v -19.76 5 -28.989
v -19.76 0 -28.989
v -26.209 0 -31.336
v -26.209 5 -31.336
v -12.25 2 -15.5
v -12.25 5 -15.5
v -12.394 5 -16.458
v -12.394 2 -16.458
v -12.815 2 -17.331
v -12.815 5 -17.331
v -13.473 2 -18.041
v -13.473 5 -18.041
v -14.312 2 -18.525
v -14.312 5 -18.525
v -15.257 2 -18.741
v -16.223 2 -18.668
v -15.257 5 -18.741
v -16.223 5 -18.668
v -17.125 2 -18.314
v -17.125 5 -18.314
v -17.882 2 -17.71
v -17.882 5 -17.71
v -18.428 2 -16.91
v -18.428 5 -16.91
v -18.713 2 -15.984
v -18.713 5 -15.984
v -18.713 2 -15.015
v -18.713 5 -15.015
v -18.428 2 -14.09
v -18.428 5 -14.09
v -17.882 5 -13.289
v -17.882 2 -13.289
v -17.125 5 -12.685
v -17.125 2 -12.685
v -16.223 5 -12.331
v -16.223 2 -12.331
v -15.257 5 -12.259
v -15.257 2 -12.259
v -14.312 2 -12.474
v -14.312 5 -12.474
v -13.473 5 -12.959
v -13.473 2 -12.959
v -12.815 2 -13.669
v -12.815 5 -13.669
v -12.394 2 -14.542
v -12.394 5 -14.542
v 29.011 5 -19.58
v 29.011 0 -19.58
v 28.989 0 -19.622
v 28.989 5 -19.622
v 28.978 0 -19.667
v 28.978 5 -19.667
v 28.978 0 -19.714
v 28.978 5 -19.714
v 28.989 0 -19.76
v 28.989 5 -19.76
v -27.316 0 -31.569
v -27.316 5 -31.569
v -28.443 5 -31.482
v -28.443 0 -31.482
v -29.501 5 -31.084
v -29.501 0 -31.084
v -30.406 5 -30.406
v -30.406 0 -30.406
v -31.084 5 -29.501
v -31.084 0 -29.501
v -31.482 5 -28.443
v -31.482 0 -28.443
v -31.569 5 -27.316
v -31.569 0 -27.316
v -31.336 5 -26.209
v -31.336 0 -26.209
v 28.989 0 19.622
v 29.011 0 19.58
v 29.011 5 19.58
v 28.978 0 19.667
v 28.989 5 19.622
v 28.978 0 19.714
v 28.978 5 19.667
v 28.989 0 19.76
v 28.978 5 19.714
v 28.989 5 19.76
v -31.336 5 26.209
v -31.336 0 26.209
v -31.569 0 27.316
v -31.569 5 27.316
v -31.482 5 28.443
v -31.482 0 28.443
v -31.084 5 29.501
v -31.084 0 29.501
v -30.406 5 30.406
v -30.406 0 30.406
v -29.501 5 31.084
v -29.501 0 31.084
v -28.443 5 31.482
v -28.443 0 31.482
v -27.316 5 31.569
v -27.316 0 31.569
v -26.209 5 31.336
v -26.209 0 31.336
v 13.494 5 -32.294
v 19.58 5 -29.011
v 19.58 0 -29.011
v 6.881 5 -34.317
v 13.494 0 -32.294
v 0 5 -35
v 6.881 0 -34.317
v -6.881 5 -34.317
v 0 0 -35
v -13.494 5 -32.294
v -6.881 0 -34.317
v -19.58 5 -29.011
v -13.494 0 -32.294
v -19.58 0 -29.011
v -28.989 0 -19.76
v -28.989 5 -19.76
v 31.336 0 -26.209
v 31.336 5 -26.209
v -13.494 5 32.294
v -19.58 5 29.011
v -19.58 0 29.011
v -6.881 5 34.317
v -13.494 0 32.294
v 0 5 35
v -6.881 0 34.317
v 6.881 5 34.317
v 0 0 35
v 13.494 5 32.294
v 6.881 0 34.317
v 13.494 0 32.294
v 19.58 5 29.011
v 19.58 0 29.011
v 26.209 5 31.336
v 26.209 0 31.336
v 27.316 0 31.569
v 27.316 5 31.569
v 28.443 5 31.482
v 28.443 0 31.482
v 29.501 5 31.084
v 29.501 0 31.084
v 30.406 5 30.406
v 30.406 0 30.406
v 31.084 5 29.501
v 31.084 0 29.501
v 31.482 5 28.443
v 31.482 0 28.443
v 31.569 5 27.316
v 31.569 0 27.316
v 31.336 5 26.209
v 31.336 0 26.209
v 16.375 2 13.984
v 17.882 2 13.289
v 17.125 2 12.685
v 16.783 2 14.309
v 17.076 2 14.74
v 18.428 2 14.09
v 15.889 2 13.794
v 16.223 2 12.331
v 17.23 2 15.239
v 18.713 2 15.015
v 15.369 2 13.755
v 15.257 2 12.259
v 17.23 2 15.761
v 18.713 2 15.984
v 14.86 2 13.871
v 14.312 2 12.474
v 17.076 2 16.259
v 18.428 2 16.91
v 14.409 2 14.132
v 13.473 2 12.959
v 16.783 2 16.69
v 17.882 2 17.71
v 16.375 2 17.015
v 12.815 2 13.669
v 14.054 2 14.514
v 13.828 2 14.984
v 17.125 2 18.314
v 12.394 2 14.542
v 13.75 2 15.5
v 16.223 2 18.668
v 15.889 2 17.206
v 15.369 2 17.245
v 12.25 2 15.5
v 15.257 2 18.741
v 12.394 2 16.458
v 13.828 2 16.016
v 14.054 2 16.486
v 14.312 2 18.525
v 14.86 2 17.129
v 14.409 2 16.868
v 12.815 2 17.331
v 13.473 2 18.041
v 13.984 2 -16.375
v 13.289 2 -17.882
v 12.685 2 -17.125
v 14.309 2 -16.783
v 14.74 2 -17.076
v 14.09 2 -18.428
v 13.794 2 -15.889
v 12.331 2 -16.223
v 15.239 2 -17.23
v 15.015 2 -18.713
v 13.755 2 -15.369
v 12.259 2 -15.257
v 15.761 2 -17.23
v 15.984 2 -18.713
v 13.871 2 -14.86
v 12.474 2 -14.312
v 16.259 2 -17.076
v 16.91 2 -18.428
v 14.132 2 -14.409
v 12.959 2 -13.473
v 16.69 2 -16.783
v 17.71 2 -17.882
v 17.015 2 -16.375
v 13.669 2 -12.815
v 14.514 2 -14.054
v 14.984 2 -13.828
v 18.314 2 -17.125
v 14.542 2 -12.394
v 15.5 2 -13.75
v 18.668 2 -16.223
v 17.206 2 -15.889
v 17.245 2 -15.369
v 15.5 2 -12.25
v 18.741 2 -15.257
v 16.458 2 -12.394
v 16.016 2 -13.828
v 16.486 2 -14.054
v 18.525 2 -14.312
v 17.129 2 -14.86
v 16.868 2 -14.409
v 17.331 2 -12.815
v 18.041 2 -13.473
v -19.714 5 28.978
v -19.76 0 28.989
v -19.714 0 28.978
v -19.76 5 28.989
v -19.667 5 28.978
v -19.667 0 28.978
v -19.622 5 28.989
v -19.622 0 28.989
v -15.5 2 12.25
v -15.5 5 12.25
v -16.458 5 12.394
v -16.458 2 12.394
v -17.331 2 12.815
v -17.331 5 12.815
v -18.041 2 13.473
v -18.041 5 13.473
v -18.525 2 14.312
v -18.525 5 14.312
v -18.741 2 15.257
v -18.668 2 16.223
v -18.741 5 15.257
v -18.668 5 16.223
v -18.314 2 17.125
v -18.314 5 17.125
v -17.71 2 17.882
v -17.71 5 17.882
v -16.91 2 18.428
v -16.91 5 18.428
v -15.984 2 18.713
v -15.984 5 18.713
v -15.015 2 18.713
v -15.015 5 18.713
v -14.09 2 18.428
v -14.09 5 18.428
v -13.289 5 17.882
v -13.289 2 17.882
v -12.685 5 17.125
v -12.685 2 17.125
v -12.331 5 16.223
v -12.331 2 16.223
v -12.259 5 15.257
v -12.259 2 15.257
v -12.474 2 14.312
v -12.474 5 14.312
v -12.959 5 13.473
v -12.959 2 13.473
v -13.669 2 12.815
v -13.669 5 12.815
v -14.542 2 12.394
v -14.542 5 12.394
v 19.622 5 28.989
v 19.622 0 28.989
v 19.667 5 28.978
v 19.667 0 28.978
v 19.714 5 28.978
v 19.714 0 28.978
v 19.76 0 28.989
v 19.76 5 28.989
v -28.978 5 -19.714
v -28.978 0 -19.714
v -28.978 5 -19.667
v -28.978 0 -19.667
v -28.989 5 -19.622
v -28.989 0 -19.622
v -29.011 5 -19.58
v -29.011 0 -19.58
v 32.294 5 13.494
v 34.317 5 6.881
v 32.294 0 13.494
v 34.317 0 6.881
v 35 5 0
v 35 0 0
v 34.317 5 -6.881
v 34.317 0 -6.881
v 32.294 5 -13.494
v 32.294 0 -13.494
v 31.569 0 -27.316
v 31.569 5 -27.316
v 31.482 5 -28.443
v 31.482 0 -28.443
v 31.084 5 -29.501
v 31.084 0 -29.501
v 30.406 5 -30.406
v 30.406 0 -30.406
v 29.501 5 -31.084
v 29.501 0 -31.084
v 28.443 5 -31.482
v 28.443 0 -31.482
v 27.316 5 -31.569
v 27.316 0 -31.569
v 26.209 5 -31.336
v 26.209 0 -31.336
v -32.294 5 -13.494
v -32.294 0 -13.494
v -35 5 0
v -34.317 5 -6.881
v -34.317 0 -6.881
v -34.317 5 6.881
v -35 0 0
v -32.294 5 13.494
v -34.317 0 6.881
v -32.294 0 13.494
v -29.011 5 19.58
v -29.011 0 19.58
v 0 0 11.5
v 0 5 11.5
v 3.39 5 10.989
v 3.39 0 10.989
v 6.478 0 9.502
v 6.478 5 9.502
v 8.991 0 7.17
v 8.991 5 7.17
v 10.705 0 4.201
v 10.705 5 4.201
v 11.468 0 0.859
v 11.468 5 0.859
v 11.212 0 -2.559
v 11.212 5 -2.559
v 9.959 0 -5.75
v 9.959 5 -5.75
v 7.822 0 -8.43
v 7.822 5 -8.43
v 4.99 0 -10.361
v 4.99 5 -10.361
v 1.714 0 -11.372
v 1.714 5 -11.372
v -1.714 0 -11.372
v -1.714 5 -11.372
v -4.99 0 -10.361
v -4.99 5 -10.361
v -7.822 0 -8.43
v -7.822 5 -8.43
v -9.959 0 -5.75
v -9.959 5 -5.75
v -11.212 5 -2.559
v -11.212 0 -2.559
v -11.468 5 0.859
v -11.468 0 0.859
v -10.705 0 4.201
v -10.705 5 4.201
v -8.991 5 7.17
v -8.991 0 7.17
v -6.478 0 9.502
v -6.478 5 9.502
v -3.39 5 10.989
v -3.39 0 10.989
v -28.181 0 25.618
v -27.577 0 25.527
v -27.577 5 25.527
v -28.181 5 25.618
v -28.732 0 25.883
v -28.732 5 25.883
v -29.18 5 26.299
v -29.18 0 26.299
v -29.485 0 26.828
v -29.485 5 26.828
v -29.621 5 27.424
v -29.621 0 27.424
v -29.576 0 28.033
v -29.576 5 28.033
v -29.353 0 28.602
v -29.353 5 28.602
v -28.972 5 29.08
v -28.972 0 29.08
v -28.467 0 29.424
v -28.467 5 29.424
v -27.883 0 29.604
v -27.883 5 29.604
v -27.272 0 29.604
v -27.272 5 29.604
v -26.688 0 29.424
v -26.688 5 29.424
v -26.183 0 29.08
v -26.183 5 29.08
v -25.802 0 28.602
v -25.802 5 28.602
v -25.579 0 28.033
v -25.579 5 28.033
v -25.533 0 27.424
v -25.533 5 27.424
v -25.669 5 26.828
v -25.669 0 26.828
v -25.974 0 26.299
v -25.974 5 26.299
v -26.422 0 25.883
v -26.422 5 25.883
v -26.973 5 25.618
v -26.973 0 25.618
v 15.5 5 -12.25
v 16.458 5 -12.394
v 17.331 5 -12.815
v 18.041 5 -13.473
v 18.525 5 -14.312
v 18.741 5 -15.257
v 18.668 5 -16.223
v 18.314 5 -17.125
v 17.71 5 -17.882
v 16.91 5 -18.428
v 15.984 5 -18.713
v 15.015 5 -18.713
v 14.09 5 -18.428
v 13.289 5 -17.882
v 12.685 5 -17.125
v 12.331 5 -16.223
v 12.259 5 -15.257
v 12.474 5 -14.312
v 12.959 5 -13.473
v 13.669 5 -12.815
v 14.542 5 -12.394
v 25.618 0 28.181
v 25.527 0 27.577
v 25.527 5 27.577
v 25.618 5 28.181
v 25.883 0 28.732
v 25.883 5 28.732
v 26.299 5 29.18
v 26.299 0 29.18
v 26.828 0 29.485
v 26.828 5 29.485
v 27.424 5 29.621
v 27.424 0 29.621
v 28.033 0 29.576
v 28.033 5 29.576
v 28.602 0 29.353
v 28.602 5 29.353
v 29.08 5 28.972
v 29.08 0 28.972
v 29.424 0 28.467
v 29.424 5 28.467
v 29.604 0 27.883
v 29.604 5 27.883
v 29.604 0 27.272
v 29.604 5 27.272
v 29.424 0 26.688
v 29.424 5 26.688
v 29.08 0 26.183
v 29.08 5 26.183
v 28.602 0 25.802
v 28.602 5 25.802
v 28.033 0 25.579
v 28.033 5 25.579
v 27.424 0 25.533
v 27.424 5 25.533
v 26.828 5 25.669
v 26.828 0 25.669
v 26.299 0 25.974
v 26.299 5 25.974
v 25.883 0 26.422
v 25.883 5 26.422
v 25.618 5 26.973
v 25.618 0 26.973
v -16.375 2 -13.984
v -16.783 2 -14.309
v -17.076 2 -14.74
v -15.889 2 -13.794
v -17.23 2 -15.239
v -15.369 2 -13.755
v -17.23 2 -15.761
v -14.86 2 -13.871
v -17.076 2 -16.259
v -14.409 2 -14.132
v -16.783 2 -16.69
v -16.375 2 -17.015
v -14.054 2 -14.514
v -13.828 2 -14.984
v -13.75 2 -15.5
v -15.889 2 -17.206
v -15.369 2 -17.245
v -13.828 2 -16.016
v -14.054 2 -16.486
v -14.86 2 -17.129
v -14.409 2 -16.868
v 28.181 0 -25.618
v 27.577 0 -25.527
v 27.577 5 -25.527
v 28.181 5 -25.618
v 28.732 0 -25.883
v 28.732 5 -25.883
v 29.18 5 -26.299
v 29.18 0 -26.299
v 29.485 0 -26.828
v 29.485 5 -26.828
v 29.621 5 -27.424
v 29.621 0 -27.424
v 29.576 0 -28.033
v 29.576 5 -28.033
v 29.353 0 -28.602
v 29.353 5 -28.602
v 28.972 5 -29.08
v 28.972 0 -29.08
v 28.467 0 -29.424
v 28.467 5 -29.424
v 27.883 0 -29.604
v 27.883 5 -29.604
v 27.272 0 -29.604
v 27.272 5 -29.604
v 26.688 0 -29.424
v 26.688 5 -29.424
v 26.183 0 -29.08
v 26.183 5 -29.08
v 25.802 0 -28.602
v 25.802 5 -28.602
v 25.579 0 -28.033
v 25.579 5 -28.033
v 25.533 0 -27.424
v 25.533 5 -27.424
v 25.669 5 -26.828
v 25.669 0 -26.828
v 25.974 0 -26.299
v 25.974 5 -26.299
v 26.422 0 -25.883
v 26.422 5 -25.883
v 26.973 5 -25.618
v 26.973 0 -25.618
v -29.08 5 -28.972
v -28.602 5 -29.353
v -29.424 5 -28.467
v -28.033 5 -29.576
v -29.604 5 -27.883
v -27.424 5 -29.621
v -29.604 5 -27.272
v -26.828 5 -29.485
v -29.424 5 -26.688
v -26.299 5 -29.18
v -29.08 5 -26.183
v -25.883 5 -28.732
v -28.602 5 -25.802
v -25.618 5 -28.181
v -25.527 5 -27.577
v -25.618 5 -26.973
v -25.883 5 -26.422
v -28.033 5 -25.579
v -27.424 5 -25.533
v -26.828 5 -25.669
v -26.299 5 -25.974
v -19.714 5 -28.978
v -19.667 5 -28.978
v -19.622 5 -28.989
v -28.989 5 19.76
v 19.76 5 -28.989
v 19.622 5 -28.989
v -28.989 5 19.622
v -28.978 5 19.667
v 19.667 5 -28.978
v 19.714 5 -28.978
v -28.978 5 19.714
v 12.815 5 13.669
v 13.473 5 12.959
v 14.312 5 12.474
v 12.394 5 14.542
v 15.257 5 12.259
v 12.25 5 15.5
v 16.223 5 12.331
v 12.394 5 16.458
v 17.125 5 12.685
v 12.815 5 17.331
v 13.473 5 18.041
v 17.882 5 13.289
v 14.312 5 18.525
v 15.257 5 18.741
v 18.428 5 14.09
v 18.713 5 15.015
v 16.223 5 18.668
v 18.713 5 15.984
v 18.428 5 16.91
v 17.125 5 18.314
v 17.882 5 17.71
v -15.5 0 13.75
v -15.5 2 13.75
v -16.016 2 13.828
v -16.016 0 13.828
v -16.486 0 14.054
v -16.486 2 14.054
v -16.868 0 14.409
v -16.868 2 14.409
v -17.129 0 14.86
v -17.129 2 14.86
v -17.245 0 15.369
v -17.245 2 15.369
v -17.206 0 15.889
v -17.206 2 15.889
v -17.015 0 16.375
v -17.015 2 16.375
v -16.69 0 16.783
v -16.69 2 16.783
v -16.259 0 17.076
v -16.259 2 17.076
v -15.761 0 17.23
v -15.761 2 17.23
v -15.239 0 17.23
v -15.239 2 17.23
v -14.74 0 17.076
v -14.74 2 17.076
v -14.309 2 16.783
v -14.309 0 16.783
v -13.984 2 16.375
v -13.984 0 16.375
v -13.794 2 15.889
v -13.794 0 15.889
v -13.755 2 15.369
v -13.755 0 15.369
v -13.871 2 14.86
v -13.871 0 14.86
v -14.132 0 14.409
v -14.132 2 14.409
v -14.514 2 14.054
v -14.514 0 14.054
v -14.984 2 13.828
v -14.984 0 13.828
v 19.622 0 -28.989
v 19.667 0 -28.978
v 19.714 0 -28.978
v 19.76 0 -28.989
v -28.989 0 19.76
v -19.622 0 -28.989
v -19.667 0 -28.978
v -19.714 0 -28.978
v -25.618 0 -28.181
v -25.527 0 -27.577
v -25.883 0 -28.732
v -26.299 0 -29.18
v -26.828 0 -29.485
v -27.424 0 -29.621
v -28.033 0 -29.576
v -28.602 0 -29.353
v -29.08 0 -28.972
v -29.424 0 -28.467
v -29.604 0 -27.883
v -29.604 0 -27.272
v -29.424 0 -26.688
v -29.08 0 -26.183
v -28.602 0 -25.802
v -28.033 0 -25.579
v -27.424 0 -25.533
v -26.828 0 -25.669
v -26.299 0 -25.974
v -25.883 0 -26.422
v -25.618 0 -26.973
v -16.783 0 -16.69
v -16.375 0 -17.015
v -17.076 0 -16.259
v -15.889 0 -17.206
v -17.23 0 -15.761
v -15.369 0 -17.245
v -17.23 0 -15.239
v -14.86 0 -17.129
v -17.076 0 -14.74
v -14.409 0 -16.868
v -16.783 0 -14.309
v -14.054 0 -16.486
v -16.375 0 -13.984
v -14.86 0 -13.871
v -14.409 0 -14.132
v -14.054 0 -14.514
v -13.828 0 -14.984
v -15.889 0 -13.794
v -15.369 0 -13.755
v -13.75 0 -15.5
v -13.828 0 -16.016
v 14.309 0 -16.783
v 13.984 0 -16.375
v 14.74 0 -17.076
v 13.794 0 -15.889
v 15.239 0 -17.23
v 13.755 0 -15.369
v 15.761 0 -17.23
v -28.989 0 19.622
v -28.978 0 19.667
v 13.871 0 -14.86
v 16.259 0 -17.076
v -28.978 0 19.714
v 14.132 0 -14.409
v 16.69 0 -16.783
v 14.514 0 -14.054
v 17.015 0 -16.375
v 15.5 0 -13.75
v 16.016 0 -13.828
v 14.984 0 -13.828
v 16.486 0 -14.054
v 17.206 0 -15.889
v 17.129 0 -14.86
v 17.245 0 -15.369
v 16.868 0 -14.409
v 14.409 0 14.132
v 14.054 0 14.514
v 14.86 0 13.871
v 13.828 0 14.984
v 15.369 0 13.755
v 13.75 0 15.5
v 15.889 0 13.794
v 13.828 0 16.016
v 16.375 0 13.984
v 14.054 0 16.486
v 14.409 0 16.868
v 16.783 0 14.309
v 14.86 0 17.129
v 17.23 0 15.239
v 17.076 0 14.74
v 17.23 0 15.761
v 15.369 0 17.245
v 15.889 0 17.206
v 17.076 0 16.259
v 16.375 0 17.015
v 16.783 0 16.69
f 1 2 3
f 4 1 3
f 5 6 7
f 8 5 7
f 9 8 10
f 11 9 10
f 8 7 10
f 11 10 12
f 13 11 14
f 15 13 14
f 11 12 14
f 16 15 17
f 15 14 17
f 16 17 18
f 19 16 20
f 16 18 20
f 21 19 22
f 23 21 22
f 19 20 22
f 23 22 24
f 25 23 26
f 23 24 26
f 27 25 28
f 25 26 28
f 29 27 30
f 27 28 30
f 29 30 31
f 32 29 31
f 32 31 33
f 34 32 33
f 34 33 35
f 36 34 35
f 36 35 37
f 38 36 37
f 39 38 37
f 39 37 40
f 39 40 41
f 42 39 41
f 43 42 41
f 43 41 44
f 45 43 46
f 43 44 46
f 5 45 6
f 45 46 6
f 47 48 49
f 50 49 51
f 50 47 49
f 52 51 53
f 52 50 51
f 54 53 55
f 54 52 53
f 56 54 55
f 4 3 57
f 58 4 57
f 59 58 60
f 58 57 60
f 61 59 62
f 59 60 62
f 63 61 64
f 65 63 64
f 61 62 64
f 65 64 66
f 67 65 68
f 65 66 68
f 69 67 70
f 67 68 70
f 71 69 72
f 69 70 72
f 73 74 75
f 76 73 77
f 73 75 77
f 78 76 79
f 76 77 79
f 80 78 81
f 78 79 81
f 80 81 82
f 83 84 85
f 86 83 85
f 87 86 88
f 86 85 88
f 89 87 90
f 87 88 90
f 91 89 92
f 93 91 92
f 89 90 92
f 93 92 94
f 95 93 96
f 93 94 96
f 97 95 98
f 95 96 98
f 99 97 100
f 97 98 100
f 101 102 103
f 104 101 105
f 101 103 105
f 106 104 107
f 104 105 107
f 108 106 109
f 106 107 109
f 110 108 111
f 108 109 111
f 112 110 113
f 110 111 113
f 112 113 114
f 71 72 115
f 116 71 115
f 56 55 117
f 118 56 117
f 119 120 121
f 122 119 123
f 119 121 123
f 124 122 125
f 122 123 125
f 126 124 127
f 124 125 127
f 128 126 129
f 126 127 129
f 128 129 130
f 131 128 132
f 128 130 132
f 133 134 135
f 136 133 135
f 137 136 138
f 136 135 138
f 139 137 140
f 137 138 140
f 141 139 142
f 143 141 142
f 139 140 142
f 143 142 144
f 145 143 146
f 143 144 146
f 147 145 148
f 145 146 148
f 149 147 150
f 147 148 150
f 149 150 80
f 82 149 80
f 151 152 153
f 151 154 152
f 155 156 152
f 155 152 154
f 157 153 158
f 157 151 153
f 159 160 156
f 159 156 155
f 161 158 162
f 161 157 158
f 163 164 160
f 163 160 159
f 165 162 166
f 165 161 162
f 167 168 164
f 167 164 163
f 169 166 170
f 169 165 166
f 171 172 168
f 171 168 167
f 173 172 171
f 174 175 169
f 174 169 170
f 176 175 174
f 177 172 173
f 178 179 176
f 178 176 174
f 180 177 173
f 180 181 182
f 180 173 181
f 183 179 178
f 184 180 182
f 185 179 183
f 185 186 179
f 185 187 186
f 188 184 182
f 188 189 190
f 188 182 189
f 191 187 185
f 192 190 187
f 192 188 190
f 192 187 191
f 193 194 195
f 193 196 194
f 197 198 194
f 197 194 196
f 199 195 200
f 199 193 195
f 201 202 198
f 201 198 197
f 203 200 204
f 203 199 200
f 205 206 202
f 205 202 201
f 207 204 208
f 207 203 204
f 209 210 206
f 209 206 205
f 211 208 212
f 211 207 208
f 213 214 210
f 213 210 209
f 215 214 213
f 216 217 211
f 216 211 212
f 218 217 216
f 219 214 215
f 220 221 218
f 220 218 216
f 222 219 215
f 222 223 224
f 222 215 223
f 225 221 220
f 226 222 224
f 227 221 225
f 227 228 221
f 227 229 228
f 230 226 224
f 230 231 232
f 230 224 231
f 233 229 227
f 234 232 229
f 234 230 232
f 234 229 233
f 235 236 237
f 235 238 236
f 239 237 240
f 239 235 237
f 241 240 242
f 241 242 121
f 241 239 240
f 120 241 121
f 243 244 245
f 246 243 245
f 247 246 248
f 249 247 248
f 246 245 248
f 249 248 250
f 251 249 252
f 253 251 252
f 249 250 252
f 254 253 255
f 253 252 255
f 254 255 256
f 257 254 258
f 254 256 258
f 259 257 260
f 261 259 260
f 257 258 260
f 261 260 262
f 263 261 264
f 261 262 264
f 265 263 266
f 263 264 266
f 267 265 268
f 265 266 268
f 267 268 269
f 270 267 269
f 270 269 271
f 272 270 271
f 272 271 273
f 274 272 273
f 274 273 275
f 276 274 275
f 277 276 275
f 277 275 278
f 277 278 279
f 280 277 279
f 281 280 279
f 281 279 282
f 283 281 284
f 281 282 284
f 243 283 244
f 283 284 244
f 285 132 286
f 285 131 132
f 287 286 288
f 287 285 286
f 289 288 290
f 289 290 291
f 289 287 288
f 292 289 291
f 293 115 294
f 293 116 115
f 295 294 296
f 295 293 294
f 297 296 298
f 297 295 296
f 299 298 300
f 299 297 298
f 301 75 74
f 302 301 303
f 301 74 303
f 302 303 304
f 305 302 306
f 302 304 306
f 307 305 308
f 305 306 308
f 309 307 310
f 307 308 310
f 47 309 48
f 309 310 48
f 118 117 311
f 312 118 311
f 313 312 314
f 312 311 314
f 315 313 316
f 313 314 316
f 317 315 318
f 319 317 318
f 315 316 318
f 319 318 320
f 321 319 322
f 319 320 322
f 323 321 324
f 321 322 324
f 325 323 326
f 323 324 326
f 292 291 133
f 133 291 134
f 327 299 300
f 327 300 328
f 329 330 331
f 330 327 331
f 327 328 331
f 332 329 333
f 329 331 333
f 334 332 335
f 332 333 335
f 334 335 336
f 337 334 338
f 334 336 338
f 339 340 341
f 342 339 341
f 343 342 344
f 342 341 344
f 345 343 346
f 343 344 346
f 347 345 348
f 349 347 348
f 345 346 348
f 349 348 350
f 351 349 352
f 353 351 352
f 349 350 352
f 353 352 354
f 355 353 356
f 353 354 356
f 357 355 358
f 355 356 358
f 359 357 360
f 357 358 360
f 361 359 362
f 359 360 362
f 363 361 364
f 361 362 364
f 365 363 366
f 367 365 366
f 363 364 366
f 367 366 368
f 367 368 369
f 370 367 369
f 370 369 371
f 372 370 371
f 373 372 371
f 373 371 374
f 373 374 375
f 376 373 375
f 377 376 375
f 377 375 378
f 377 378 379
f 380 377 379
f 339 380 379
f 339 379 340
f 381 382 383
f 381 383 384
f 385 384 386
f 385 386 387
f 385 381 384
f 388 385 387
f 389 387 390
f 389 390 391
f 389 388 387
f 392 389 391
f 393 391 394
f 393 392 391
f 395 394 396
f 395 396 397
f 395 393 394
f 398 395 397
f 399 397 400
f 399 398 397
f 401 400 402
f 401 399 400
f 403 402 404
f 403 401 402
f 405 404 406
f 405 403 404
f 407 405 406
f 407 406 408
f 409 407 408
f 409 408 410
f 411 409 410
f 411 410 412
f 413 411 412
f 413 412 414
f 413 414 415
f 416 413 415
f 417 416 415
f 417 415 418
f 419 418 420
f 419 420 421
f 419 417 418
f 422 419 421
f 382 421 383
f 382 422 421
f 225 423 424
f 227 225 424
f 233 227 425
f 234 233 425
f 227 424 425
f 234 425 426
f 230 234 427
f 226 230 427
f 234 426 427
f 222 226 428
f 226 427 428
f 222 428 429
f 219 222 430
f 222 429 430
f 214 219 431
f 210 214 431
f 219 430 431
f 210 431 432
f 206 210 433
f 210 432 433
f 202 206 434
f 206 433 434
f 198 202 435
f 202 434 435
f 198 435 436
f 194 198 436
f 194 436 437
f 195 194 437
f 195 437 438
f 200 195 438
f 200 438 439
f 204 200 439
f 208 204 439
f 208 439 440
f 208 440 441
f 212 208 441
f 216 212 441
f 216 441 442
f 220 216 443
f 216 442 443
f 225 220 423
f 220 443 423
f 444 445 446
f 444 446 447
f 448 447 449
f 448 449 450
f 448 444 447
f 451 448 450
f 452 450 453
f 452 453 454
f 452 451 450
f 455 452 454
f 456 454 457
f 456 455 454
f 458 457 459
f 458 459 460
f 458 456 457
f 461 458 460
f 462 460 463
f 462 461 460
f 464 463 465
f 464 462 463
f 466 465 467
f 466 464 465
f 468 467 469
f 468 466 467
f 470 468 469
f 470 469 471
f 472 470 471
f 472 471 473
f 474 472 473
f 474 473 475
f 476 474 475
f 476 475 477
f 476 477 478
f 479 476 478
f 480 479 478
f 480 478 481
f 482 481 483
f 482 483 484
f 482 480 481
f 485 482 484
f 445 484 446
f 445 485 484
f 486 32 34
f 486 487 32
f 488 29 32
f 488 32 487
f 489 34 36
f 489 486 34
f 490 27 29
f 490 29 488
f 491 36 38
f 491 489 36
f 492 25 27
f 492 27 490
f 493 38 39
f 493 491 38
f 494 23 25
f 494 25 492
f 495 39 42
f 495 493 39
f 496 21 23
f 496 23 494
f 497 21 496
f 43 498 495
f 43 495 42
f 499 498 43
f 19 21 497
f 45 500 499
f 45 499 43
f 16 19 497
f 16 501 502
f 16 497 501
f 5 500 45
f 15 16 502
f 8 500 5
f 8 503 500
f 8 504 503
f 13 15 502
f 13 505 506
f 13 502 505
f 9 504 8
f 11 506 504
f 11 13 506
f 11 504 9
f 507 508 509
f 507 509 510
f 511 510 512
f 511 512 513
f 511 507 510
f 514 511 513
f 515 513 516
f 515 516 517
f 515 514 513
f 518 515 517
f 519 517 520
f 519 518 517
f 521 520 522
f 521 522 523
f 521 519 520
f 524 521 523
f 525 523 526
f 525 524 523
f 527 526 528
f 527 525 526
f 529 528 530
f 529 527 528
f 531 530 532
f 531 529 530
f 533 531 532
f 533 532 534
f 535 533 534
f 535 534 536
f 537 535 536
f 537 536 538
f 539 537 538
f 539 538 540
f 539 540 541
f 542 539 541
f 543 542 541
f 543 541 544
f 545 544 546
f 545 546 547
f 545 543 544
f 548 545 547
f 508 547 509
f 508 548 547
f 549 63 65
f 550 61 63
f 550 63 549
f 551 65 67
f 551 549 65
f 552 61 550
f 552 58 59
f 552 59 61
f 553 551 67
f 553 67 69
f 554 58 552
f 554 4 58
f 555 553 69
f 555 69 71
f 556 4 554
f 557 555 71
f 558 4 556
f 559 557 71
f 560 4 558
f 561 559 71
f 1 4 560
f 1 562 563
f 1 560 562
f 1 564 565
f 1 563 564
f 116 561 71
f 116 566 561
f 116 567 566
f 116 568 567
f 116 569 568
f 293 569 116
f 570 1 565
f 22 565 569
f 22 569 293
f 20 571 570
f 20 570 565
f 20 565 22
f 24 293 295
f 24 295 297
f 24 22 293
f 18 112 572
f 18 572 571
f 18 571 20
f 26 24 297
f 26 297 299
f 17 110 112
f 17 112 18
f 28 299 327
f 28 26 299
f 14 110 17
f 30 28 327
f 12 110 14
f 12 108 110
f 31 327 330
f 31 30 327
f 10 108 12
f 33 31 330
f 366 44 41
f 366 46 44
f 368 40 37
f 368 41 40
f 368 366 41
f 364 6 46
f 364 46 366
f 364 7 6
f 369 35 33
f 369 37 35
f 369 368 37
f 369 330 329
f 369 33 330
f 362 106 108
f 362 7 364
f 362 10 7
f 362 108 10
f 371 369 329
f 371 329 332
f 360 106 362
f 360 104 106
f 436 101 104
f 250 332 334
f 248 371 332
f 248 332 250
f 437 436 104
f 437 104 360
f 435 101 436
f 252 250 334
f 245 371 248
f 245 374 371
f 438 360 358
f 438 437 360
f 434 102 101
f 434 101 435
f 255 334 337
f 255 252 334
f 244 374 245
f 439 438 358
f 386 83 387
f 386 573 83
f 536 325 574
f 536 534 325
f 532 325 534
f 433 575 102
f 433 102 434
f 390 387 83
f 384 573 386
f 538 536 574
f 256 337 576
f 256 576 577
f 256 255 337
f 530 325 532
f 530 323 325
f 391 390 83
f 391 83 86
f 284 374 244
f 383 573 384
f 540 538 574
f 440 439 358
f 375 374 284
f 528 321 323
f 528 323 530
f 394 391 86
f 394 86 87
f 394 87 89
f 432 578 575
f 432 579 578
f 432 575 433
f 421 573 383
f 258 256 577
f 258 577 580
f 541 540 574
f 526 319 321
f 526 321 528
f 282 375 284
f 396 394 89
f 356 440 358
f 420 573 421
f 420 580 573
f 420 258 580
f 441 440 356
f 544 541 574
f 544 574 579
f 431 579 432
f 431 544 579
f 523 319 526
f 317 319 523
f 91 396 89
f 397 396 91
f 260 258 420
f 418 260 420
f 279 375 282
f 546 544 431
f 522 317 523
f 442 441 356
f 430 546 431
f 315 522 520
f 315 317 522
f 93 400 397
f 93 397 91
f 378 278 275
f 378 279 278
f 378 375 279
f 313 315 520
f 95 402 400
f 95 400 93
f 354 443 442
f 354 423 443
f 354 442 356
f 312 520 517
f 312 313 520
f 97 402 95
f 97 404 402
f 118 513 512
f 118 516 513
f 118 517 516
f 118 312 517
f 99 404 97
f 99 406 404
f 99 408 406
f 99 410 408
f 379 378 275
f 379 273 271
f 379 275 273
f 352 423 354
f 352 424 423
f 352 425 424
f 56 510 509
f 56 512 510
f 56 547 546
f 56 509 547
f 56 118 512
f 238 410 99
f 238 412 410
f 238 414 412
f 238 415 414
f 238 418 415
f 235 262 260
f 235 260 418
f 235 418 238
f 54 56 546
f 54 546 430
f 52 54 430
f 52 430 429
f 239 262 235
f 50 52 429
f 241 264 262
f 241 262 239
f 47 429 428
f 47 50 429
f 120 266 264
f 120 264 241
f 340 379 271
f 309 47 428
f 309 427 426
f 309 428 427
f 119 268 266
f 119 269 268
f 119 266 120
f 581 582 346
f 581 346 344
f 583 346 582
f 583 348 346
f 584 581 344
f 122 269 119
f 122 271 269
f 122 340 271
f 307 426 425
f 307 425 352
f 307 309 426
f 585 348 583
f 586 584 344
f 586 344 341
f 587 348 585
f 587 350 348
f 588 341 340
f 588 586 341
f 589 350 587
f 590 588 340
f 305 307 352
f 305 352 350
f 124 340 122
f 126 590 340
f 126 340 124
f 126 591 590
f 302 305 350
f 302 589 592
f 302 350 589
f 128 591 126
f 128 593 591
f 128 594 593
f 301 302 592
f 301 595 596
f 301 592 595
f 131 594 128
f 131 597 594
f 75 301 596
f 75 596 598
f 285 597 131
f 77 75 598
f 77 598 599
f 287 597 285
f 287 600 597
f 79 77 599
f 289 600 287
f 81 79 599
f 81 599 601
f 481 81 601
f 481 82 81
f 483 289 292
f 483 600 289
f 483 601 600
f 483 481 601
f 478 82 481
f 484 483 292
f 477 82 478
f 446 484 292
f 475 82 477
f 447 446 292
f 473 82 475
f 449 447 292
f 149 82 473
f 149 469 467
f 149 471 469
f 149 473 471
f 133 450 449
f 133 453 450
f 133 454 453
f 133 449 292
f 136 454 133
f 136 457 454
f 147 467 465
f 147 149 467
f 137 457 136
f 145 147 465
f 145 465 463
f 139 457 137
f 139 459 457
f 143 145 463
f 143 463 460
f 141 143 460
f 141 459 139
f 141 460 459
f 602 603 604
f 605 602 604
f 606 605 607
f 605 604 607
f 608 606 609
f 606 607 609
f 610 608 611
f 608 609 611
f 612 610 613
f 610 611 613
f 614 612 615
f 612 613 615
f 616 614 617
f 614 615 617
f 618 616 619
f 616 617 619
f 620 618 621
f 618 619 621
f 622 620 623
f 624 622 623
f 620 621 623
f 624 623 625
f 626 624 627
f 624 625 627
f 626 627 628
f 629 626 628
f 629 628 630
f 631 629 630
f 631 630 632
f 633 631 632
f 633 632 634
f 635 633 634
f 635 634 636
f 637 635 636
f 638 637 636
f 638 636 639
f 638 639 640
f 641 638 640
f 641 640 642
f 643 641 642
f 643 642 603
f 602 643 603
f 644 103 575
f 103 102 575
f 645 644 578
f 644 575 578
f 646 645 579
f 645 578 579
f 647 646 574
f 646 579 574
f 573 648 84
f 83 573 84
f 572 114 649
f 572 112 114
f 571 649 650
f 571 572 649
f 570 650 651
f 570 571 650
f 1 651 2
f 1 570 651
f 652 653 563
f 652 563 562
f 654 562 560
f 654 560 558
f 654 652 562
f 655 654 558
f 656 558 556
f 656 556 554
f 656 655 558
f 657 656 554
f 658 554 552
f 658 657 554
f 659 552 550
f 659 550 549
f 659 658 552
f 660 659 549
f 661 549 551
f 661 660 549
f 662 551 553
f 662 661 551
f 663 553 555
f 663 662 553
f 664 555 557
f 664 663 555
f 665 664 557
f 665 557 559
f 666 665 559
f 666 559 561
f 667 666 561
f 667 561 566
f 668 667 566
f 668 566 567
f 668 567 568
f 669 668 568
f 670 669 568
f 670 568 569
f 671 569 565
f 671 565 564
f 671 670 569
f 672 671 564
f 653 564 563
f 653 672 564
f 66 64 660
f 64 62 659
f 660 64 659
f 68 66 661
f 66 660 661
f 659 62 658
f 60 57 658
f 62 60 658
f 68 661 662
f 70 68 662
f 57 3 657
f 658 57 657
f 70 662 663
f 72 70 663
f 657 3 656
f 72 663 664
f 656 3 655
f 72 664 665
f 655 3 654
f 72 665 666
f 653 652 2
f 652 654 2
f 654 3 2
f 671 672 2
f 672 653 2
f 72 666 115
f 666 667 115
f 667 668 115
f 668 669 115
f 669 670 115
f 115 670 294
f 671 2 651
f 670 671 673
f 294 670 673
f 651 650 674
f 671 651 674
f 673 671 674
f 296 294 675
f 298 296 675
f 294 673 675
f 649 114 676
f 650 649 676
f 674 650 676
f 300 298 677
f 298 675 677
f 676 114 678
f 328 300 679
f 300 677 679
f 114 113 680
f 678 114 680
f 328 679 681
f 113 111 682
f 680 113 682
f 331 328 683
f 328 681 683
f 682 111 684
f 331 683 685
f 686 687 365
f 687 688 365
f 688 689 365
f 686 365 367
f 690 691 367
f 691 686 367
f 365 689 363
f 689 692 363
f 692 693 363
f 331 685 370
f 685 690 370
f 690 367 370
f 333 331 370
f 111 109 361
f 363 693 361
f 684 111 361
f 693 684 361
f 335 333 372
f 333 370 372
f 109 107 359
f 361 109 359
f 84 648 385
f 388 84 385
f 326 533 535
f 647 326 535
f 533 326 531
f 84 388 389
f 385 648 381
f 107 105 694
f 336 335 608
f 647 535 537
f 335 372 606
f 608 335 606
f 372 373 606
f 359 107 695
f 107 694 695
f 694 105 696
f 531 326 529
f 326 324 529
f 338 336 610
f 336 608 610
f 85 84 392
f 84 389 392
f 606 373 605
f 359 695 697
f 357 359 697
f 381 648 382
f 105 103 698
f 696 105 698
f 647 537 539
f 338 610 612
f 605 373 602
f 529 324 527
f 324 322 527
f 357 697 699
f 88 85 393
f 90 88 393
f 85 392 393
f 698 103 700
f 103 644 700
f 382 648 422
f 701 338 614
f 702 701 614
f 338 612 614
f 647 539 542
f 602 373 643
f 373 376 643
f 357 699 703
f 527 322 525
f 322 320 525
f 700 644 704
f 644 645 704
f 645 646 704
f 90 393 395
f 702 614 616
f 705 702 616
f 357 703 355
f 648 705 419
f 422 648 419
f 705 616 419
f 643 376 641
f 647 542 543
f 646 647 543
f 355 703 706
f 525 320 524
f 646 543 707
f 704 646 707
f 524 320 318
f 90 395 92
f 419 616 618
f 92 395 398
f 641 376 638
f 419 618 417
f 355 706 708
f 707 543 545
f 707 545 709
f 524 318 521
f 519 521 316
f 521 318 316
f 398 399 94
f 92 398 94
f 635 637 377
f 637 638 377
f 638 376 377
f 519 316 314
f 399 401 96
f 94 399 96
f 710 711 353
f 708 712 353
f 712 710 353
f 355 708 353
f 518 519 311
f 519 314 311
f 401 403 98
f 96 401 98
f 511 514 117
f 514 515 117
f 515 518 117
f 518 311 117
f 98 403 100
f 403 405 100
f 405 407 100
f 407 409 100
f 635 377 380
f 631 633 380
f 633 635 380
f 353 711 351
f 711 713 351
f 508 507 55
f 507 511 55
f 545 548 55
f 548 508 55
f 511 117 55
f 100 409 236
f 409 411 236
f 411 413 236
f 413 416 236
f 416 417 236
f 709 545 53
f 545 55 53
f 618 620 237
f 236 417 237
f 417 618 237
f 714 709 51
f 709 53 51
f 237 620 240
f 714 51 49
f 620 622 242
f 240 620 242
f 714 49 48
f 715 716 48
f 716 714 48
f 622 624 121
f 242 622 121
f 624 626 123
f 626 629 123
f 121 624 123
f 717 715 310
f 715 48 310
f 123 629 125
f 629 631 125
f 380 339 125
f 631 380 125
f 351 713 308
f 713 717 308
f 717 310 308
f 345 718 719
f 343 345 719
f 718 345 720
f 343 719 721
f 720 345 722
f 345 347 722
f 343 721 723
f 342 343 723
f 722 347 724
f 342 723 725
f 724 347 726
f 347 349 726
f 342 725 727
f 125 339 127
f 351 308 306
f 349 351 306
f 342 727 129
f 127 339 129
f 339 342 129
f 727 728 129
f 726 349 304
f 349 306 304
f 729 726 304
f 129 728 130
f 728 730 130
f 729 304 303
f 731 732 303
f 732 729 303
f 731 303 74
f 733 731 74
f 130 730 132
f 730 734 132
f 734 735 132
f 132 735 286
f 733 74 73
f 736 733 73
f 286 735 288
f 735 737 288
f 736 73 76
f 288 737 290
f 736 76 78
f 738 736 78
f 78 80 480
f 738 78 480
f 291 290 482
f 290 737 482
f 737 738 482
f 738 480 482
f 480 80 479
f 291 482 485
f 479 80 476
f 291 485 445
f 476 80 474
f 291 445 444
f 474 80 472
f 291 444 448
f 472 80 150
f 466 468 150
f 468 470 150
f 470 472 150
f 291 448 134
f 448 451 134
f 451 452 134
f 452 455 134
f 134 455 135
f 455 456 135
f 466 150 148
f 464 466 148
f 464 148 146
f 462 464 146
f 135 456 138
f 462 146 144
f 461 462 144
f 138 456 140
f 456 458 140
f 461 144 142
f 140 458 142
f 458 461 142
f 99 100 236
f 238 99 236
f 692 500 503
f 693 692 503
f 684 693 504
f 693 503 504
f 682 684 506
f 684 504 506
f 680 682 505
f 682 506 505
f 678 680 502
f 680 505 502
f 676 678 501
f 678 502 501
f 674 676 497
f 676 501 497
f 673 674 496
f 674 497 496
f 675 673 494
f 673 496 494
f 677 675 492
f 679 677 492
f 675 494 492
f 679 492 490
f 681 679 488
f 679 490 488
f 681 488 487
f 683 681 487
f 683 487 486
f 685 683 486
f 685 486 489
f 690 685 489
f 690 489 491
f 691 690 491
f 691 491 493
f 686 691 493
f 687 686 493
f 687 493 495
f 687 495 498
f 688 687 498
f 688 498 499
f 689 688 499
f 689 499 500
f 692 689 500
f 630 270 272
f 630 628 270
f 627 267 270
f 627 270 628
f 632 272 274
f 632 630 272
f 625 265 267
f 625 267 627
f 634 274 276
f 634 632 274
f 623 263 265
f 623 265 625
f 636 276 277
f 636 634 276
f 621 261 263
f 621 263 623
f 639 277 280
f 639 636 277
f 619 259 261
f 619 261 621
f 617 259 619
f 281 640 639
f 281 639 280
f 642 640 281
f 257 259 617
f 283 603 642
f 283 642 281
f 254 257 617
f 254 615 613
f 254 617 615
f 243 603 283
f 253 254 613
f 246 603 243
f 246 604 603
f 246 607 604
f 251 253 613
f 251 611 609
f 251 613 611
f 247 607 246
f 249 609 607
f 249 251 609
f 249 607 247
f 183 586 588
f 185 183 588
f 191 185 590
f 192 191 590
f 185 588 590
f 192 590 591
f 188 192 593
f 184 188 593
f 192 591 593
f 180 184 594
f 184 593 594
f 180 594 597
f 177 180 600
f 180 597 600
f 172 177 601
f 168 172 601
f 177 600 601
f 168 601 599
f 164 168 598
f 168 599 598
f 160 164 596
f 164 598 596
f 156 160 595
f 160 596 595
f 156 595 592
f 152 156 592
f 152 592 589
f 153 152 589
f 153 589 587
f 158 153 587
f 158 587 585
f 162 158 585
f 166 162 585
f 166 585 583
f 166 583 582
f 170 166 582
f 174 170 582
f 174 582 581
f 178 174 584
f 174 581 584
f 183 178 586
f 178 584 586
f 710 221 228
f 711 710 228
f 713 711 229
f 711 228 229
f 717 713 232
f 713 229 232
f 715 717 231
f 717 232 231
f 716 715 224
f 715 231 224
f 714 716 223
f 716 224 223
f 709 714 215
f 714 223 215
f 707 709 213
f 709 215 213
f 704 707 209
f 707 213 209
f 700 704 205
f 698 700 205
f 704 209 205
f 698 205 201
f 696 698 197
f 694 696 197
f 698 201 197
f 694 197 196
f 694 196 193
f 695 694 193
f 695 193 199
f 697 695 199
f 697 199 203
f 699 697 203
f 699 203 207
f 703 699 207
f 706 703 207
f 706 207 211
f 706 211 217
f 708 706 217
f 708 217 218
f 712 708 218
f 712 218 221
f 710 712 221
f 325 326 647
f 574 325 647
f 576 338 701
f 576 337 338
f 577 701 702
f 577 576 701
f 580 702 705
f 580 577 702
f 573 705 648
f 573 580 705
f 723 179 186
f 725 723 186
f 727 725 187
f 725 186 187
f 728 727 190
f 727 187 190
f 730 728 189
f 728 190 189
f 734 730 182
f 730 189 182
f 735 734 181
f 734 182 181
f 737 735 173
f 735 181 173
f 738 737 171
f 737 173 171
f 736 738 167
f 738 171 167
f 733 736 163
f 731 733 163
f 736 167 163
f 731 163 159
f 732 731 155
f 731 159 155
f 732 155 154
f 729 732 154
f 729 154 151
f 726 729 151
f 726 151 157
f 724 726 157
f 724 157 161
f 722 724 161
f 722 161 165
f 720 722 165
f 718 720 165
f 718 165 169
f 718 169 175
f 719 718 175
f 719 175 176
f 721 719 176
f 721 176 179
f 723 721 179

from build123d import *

# Parameters (mm, degrees)
SKETCH1_R                = 35
BOSS_EXTRUDE1_DEPTH      = 5
SKETCH2_R                = 11.5
CUT_EXTRUDE1_DEPTH       = 50.749371855
SKETCH2_4_R              = 3.25
SKETCH2_4_R_2            = 1.75
CUT_EXTRUDE2_DEPTH       = 3
SKETCH2_5_R              = 1.75
CUT_EXTRUDE3_DEPTH       = 50.749371855
CIRPATTERN3_COUNT        = 4
BOSS_EXTRUDE2_START      = -5
SKETCH3_R                = 2.05
BOSS_EXTRUDE2_DEPTH      = 5
FILLET1_R                = 0.2
CIRPATTERN4_COUNT        = 4
FILLET1_OF_CIRPATTERN4_R = 0.2


with BuildPart() as part:
    # Sketch1 → Boss-Extrude1 (new body)
    with BuildSketch(Plane(origin=(0, 0, 0), x_dir=(1, 0, 0), z_dir=(0, 1, 0))):
        with Locations(Location((0, 0, 0), (0, 0, 270))):
            Circle(SKETCH1_R)
    extrude(amount=BOSS_EXTRUDE1_DEPTH)

    # Sketch2 → Cut-Extrude1 (cut, through all)
    with BuildSketch(Plane(origin=(0, 5, 0), x_dir=(1, 0, 0), z_dir=(0, 1, 0))):
        with Locations(Location((0, 0, 0), (0, 0, 270))):
            Circle(SKETCH2_R)
    extrude(amount=-CUT_EXTRUDE1_DEPTH, mode=Mode.SUBTRACT)

    # Sketch2<4> → Cut-Extrude2 (cut)
    with BuildSketch(Plane(origin=(0, 5, 0), x_dir=(1, 0, 0), z_dir=(0, 1, 0))):
        with Locations(Location((15.499780644, 15.499780644, 0), (0, 0, 270))):
            Circle(SKETCH2_4_R)
        with Locations(Location((15.499780644, 15.499780644, 0), (0, 0, 270))):
            Circle(SKETCH2_4_R_2, mode=Mode.SUBTRACT)
    cut_extrude2 = extrude(amount=-CUT_EXTRUDE2_DEPTH, mode=Mode.SUBTRACT)

    # Sketch2<5> → Cut-Extrude3 (cut, through all)
    with BuildSketch(Plane(origin=(0, 5, 0), x_dir=(1, 0, 0), z_dir=(0, 1, 0))):
        with Locations(Location((15.499780644, 15.499780644, 0), (0, 0, 270))):
            Circle(SKETCH2_5_R)
    cut_extrude3 = extrude(amount=-CUT_EXTRUDE3_DEPTH, mode=Mode.SUBTRACT)

    # CirPattern3: Cut-Extrude2, Cut-Extrude3 ×4 about axis
    cirpattern3_axis = Axis((0, 0, 0), (0, 1, 0))
    add([cut_extrude2.rotate(cirpattern3_axis, i * 360 / CIRPATTERN3_COUNT) for i in range(1, CIRPATTERN3_COUNT)], mode=Mode.SUBTRACT)
    add([cut_extrude3.rotate(cirpattern3_axis, i * 360 / CIRPATTERN3_COUNT) for i in range(1, CIRPATTERN3_COUNT)], mode=Mode.SUBTRACT)

    # Sketch3 → Boss-Extrude2 (add)
    with BuildSketch(Plane(origin=(0, 5, 0), x_dir=(1, 0, 0), z_dir=(0, 1, 0)).offset(BOSS_EXTRUDE2_START)):
        with BuildLine():
            ThreePointArc((19.664153078, 28.953774948), (24.748737342, 24.748737342), (28.953774948, 19.664153078))
            Line((28.953774948, 19.664153078), (31.335934949, 26.209083893))
            ThreePointArc((31.335934949, 26.209083893), (30.405591591, 30.405591591), (26.209083893, 31.335934949))
            Line((26.209083893, 31.335934949), (19.664153078, 28.953774948))
        make_face()
        with Locations(Location((27.577164466, 27.577164466, 0), (0, 0, 270))):
            Circle(SKETCH3_R, mode=Mode.SUBTRACT)
    boss_extrude2 = extrude(amount=BOSS_EXTRUDE2_DEPTH)

    # Fillet1
    fillet1_edges = [part.edges().sort_by_distance(p)[0] for p in [
        (19.664153078, 2.5, -28.953774948),
        (28.953774948, 2.5, -19.664153078),
    ]]
    fillet(fillet1_edges, radius=FILLET1_R)

    # CirPattern4: Boss-Extrude2 ×4 about axis
    cirpattern4_axis = Axis((0, 0, 0), (0, 1, 0))
    for i in range(1, CIRPATTERN4_COUNT):
        add(boss_extrude2.rotate(cirpattern4_axis, i * 360 / CIRPATTERN4_COUNT))

    # Fillet1 of CirPattern4
    fillet1_of_cirpattern4_edges = [part.edges().sort_by_distance(p)[0] for p in [
        (-28.953774948, 2.5, -19.664153078),
        (-19.664153078, 2.5, -28.953774948),
        (-19.664153078, 2.5, 28.953774948),
        (-28.953774948, 2.5, 19.664153078),
        (28.953774948, 2.5, 19.664153078),
        (19.664153078, 2.5, 28.953774948),
    ]]
    fillet(fillet1_of_cirpattern4_edges, radius=FILLET1_OF_CIRPATTERN4_R)


solid = part.part
